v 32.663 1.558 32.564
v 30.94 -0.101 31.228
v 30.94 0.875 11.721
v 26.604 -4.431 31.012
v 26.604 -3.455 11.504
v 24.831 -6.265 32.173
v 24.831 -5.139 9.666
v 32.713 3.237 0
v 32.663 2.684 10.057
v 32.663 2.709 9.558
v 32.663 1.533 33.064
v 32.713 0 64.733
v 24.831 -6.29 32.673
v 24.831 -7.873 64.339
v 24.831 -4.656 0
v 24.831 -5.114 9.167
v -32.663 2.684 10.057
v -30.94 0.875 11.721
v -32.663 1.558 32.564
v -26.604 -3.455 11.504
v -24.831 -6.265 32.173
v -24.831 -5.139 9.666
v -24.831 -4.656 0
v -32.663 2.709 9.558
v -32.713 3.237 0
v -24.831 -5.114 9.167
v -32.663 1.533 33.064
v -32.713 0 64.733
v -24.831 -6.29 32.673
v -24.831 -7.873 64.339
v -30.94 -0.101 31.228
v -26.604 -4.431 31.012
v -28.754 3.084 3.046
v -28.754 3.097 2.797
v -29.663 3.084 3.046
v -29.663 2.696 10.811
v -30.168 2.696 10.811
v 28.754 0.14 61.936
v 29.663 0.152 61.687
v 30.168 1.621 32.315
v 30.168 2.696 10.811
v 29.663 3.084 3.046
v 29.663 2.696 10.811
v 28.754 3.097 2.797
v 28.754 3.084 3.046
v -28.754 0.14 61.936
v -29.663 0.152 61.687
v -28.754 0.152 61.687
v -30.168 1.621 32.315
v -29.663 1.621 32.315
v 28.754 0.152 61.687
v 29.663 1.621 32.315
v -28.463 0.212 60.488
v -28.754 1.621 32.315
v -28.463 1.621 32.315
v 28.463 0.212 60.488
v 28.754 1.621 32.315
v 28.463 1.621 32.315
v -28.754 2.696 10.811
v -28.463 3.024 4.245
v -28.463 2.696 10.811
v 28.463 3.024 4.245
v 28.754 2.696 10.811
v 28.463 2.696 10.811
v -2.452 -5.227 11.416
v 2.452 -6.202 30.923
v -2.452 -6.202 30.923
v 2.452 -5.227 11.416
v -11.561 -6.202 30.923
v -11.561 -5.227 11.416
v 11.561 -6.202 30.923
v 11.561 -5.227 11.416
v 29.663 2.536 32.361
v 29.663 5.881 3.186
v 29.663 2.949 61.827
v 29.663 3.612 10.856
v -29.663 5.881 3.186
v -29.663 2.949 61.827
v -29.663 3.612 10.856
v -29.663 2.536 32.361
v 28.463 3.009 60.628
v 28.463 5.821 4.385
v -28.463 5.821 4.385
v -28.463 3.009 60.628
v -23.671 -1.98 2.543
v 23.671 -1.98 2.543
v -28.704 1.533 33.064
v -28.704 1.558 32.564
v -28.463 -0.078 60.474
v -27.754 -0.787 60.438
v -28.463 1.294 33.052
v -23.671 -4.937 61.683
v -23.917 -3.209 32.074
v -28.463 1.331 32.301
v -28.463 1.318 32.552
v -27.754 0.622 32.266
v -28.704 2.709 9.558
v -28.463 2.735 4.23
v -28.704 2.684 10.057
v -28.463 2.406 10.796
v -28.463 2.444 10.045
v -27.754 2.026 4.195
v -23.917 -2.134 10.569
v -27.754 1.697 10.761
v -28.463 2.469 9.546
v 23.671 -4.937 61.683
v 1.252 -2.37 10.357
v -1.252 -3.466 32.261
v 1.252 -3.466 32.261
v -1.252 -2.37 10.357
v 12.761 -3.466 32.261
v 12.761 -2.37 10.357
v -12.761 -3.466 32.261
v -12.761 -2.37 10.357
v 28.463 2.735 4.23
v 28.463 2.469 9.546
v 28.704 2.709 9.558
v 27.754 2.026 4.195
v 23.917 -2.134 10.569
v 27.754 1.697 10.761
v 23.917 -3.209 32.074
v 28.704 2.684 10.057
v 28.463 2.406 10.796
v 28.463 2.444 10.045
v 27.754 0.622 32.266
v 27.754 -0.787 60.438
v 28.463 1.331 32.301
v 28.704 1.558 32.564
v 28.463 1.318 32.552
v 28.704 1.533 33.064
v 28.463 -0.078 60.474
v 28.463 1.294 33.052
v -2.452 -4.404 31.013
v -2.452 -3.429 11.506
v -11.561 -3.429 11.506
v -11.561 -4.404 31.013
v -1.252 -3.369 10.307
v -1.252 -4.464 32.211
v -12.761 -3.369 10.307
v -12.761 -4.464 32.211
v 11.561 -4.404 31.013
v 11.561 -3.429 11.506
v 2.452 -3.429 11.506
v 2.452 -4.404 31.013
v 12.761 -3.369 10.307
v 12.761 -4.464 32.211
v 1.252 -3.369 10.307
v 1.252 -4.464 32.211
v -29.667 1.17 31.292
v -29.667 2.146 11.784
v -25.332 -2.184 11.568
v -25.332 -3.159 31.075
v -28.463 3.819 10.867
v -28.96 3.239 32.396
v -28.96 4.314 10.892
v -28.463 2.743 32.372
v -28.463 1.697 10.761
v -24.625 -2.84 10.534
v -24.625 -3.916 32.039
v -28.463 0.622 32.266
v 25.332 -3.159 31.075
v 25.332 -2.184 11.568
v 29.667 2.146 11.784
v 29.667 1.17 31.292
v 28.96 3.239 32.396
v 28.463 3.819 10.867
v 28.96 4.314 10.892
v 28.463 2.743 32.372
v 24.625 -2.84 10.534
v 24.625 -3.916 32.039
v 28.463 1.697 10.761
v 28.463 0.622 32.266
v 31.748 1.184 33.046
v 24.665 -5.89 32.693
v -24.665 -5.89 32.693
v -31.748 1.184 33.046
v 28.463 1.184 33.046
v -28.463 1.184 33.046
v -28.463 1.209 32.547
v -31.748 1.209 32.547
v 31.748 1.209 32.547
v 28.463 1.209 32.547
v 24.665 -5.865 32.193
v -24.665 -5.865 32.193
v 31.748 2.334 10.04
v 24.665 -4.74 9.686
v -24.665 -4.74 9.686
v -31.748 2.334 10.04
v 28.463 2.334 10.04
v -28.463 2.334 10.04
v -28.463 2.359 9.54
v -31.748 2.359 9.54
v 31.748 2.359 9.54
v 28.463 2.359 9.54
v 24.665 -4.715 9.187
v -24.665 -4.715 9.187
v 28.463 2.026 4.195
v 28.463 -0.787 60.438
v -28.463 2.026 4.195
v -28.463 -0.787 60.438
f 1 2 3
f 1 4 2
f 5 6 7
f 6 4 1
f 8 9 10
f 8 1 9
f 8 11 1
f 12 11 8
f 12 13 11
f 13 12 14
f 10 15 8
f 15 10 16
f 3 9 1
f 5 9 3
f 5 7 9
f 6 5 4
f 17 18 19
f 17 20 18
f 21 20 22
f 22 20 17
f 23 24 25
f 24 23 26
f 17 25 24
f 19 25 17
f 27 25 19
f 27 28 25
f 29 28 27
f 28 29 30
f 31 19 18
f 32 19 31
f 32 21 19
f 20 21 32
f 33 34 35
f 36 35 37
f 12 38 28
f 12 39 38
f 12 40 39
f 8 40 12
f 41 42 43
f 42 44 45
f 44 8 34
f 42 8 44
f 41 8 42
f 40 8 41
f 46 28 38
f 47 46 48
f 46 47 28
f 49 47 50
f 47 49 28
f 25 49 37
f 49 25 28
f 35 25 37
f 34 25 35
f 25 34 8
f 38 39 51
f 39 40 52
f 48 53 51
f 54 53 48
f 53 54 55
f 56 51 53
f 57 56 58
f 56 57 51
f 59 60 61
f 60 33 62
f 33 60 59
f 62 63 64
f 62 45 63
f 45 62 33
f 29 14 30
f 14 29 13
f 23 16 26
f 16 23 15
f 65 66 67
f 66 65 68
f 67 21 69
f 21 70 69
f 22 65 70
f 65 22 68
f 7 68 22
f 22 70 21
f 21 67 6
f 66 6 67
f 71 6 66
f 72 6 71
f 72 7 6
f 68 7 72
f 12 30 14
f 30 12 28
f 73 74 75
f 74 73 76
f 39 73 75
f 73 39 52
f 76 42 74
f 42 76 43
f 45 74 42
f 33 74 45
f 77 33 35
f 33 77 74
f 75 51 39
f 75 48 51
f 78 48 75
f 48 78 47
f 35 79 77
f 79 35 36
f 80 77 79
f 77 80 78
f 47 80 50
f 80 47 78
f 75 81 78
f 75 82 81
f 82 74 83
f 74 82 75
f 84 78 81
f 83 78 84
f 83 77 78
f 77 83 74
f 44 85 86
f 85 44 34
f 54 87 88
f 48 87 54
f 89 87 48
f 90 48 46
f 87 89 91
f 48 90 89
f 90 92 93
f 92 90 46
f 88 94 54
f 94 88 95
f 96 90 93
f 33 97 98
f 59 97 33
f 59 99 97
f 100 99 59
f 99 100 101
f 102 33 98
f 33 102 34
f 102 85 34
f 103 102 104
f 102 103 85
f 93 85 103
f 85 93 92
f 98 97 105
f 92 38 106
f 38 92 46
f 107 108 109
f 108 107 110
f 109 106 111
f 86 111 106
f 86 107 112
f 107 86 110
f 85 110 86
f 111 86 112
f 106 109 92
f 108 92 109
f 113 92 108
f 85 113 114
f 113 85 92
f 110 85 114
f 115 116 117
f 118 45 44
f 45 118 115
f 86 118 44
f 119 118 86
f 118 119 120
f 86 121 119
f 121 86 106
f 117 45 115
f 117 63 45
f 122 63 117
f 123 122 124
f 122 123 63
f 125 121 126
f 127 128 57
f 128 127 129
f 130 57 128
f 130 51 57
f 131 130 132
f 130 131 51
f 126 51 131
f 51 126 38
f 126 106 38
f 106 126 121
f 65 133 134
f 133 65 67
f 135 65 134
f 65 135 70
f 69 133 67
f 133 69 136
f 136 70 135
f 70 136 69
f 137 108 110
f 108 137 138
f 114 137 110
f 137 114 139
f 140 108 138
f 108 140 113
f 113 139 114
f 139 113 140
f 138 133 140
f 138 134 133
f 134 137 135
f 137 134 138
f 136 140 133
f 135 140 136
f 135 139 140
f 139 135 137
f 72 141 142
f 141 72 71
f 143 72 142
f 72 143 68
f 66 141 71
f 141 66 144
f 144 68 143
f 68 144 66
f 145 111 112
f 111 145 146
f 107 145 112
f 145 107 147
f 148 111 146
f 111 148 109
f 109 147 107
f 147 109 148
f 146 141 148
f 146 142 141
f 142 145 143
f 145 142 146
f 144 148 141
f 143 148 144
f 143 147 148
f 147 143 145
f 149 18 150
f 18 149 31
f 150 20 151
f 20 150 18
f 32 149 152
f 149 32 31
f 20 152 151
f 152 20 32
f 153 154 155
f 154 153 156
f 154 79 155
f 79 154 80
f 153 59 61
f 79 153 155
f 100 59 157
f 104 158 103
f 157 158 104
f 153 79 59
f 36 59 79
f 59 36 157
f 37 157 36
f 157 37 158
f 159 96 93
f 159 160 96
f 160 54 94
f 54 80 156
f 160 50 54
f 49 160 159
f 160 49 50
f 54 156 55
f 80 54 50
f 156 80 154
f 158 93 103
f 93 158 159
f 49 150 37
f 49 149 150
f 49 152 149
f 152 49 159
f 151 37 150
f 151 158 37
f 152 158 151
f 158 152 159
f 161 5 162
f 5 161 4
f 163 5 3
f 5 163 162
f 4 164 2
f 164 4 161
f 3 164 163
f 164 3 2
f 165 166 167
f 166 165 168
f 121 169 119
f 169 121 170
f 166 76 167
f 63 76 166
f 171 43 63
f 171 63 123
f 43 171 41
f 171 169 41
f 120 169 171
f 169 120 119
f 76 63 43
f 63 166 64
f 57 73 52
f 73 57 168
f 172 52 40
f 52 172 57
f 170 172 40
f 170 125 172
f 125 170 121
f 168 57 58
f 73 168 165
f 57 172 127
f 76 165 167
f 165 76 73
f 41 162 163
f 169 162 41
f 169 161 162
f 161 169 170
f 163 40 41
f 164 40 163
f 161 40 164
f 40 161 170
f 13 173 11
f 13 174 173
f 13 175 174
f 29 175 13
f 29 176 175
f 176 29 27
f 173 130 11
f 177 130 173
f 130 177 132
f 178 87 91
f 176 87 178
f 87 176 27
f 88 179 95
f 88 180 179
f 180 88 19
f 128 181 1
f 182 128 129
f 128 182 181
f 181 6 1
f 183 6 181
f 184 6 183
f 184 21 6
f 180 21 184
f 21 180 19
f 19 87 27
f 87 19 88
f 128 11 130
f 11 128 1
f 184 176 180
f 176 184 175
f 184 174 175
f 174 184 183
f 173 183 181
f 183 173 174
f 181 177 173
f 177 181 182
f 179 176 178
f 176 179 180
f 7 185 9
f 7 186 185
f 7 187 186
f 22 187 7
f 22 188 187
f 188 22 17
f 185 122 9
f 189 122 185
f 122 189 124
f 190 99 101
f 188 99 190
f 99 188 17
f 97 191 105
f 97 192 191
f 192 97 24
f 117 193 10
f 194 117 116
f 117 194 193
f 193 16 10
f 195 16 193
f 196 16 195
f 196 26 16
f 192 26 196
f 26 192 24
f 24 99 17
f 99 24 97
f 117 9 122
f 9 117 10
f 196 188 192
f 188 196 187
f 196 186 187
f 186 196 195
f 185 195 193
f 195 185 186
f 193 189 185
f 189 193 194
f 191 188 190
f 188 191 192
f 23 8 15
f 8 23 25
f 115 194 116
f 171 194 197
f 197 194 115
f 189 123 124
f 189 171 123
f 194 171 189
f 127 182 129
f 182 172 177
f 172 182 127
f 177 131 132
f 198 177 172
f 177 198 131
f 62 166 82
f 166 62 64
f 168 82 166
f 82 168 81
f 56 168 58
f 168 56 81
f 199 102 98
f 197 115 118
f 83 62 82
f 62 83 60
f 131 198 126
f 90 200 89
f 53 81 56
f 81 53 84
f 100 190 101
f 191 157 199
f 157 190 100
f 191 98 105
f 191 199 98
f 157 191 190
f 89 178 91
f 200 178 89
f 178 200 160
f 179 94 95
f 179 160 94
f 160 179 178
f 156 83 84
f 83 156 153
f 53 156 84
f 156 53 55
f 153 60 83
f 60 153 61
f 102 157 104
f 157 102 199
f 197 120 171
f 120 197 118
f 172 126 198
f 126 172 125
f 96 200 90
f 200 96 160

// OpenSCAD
// =====================================================================
//  VIEW 02: BAY  -  print 2
//  Milwaukee Road 1939 rib side bay window caboose - G scale (1:29)
//  Bay window (with road number board)
//  Print orientation: top-down, sloped top flat on the bed
//
//  Open this file in OpenSCAD to look at just this part.
//  To export this part's STL: Render (F6), then File > Export > STL.
//  The part's code lives in library/bay.scad; settings in
//  library/caboose_params.scad.
// =====================================================================

part     = "bay";    // which part - leave as is
view     = "print";  // "print"     = laid out as it goes on the printer bed
                     //               (same as the exported STL)
                     // "installed" = in its place on the car (all copies)
show_car = false;    // with "installed": faint see-through body, roof and
                     //   underframe around it for context

include <../library/caboose_all.scad>

if (view == "installed") {
    caboose_installed(part);
    if (show_car) car_ghost();
} else {
    caboose_print(part);
}
echo(str("bay: print 2"));
